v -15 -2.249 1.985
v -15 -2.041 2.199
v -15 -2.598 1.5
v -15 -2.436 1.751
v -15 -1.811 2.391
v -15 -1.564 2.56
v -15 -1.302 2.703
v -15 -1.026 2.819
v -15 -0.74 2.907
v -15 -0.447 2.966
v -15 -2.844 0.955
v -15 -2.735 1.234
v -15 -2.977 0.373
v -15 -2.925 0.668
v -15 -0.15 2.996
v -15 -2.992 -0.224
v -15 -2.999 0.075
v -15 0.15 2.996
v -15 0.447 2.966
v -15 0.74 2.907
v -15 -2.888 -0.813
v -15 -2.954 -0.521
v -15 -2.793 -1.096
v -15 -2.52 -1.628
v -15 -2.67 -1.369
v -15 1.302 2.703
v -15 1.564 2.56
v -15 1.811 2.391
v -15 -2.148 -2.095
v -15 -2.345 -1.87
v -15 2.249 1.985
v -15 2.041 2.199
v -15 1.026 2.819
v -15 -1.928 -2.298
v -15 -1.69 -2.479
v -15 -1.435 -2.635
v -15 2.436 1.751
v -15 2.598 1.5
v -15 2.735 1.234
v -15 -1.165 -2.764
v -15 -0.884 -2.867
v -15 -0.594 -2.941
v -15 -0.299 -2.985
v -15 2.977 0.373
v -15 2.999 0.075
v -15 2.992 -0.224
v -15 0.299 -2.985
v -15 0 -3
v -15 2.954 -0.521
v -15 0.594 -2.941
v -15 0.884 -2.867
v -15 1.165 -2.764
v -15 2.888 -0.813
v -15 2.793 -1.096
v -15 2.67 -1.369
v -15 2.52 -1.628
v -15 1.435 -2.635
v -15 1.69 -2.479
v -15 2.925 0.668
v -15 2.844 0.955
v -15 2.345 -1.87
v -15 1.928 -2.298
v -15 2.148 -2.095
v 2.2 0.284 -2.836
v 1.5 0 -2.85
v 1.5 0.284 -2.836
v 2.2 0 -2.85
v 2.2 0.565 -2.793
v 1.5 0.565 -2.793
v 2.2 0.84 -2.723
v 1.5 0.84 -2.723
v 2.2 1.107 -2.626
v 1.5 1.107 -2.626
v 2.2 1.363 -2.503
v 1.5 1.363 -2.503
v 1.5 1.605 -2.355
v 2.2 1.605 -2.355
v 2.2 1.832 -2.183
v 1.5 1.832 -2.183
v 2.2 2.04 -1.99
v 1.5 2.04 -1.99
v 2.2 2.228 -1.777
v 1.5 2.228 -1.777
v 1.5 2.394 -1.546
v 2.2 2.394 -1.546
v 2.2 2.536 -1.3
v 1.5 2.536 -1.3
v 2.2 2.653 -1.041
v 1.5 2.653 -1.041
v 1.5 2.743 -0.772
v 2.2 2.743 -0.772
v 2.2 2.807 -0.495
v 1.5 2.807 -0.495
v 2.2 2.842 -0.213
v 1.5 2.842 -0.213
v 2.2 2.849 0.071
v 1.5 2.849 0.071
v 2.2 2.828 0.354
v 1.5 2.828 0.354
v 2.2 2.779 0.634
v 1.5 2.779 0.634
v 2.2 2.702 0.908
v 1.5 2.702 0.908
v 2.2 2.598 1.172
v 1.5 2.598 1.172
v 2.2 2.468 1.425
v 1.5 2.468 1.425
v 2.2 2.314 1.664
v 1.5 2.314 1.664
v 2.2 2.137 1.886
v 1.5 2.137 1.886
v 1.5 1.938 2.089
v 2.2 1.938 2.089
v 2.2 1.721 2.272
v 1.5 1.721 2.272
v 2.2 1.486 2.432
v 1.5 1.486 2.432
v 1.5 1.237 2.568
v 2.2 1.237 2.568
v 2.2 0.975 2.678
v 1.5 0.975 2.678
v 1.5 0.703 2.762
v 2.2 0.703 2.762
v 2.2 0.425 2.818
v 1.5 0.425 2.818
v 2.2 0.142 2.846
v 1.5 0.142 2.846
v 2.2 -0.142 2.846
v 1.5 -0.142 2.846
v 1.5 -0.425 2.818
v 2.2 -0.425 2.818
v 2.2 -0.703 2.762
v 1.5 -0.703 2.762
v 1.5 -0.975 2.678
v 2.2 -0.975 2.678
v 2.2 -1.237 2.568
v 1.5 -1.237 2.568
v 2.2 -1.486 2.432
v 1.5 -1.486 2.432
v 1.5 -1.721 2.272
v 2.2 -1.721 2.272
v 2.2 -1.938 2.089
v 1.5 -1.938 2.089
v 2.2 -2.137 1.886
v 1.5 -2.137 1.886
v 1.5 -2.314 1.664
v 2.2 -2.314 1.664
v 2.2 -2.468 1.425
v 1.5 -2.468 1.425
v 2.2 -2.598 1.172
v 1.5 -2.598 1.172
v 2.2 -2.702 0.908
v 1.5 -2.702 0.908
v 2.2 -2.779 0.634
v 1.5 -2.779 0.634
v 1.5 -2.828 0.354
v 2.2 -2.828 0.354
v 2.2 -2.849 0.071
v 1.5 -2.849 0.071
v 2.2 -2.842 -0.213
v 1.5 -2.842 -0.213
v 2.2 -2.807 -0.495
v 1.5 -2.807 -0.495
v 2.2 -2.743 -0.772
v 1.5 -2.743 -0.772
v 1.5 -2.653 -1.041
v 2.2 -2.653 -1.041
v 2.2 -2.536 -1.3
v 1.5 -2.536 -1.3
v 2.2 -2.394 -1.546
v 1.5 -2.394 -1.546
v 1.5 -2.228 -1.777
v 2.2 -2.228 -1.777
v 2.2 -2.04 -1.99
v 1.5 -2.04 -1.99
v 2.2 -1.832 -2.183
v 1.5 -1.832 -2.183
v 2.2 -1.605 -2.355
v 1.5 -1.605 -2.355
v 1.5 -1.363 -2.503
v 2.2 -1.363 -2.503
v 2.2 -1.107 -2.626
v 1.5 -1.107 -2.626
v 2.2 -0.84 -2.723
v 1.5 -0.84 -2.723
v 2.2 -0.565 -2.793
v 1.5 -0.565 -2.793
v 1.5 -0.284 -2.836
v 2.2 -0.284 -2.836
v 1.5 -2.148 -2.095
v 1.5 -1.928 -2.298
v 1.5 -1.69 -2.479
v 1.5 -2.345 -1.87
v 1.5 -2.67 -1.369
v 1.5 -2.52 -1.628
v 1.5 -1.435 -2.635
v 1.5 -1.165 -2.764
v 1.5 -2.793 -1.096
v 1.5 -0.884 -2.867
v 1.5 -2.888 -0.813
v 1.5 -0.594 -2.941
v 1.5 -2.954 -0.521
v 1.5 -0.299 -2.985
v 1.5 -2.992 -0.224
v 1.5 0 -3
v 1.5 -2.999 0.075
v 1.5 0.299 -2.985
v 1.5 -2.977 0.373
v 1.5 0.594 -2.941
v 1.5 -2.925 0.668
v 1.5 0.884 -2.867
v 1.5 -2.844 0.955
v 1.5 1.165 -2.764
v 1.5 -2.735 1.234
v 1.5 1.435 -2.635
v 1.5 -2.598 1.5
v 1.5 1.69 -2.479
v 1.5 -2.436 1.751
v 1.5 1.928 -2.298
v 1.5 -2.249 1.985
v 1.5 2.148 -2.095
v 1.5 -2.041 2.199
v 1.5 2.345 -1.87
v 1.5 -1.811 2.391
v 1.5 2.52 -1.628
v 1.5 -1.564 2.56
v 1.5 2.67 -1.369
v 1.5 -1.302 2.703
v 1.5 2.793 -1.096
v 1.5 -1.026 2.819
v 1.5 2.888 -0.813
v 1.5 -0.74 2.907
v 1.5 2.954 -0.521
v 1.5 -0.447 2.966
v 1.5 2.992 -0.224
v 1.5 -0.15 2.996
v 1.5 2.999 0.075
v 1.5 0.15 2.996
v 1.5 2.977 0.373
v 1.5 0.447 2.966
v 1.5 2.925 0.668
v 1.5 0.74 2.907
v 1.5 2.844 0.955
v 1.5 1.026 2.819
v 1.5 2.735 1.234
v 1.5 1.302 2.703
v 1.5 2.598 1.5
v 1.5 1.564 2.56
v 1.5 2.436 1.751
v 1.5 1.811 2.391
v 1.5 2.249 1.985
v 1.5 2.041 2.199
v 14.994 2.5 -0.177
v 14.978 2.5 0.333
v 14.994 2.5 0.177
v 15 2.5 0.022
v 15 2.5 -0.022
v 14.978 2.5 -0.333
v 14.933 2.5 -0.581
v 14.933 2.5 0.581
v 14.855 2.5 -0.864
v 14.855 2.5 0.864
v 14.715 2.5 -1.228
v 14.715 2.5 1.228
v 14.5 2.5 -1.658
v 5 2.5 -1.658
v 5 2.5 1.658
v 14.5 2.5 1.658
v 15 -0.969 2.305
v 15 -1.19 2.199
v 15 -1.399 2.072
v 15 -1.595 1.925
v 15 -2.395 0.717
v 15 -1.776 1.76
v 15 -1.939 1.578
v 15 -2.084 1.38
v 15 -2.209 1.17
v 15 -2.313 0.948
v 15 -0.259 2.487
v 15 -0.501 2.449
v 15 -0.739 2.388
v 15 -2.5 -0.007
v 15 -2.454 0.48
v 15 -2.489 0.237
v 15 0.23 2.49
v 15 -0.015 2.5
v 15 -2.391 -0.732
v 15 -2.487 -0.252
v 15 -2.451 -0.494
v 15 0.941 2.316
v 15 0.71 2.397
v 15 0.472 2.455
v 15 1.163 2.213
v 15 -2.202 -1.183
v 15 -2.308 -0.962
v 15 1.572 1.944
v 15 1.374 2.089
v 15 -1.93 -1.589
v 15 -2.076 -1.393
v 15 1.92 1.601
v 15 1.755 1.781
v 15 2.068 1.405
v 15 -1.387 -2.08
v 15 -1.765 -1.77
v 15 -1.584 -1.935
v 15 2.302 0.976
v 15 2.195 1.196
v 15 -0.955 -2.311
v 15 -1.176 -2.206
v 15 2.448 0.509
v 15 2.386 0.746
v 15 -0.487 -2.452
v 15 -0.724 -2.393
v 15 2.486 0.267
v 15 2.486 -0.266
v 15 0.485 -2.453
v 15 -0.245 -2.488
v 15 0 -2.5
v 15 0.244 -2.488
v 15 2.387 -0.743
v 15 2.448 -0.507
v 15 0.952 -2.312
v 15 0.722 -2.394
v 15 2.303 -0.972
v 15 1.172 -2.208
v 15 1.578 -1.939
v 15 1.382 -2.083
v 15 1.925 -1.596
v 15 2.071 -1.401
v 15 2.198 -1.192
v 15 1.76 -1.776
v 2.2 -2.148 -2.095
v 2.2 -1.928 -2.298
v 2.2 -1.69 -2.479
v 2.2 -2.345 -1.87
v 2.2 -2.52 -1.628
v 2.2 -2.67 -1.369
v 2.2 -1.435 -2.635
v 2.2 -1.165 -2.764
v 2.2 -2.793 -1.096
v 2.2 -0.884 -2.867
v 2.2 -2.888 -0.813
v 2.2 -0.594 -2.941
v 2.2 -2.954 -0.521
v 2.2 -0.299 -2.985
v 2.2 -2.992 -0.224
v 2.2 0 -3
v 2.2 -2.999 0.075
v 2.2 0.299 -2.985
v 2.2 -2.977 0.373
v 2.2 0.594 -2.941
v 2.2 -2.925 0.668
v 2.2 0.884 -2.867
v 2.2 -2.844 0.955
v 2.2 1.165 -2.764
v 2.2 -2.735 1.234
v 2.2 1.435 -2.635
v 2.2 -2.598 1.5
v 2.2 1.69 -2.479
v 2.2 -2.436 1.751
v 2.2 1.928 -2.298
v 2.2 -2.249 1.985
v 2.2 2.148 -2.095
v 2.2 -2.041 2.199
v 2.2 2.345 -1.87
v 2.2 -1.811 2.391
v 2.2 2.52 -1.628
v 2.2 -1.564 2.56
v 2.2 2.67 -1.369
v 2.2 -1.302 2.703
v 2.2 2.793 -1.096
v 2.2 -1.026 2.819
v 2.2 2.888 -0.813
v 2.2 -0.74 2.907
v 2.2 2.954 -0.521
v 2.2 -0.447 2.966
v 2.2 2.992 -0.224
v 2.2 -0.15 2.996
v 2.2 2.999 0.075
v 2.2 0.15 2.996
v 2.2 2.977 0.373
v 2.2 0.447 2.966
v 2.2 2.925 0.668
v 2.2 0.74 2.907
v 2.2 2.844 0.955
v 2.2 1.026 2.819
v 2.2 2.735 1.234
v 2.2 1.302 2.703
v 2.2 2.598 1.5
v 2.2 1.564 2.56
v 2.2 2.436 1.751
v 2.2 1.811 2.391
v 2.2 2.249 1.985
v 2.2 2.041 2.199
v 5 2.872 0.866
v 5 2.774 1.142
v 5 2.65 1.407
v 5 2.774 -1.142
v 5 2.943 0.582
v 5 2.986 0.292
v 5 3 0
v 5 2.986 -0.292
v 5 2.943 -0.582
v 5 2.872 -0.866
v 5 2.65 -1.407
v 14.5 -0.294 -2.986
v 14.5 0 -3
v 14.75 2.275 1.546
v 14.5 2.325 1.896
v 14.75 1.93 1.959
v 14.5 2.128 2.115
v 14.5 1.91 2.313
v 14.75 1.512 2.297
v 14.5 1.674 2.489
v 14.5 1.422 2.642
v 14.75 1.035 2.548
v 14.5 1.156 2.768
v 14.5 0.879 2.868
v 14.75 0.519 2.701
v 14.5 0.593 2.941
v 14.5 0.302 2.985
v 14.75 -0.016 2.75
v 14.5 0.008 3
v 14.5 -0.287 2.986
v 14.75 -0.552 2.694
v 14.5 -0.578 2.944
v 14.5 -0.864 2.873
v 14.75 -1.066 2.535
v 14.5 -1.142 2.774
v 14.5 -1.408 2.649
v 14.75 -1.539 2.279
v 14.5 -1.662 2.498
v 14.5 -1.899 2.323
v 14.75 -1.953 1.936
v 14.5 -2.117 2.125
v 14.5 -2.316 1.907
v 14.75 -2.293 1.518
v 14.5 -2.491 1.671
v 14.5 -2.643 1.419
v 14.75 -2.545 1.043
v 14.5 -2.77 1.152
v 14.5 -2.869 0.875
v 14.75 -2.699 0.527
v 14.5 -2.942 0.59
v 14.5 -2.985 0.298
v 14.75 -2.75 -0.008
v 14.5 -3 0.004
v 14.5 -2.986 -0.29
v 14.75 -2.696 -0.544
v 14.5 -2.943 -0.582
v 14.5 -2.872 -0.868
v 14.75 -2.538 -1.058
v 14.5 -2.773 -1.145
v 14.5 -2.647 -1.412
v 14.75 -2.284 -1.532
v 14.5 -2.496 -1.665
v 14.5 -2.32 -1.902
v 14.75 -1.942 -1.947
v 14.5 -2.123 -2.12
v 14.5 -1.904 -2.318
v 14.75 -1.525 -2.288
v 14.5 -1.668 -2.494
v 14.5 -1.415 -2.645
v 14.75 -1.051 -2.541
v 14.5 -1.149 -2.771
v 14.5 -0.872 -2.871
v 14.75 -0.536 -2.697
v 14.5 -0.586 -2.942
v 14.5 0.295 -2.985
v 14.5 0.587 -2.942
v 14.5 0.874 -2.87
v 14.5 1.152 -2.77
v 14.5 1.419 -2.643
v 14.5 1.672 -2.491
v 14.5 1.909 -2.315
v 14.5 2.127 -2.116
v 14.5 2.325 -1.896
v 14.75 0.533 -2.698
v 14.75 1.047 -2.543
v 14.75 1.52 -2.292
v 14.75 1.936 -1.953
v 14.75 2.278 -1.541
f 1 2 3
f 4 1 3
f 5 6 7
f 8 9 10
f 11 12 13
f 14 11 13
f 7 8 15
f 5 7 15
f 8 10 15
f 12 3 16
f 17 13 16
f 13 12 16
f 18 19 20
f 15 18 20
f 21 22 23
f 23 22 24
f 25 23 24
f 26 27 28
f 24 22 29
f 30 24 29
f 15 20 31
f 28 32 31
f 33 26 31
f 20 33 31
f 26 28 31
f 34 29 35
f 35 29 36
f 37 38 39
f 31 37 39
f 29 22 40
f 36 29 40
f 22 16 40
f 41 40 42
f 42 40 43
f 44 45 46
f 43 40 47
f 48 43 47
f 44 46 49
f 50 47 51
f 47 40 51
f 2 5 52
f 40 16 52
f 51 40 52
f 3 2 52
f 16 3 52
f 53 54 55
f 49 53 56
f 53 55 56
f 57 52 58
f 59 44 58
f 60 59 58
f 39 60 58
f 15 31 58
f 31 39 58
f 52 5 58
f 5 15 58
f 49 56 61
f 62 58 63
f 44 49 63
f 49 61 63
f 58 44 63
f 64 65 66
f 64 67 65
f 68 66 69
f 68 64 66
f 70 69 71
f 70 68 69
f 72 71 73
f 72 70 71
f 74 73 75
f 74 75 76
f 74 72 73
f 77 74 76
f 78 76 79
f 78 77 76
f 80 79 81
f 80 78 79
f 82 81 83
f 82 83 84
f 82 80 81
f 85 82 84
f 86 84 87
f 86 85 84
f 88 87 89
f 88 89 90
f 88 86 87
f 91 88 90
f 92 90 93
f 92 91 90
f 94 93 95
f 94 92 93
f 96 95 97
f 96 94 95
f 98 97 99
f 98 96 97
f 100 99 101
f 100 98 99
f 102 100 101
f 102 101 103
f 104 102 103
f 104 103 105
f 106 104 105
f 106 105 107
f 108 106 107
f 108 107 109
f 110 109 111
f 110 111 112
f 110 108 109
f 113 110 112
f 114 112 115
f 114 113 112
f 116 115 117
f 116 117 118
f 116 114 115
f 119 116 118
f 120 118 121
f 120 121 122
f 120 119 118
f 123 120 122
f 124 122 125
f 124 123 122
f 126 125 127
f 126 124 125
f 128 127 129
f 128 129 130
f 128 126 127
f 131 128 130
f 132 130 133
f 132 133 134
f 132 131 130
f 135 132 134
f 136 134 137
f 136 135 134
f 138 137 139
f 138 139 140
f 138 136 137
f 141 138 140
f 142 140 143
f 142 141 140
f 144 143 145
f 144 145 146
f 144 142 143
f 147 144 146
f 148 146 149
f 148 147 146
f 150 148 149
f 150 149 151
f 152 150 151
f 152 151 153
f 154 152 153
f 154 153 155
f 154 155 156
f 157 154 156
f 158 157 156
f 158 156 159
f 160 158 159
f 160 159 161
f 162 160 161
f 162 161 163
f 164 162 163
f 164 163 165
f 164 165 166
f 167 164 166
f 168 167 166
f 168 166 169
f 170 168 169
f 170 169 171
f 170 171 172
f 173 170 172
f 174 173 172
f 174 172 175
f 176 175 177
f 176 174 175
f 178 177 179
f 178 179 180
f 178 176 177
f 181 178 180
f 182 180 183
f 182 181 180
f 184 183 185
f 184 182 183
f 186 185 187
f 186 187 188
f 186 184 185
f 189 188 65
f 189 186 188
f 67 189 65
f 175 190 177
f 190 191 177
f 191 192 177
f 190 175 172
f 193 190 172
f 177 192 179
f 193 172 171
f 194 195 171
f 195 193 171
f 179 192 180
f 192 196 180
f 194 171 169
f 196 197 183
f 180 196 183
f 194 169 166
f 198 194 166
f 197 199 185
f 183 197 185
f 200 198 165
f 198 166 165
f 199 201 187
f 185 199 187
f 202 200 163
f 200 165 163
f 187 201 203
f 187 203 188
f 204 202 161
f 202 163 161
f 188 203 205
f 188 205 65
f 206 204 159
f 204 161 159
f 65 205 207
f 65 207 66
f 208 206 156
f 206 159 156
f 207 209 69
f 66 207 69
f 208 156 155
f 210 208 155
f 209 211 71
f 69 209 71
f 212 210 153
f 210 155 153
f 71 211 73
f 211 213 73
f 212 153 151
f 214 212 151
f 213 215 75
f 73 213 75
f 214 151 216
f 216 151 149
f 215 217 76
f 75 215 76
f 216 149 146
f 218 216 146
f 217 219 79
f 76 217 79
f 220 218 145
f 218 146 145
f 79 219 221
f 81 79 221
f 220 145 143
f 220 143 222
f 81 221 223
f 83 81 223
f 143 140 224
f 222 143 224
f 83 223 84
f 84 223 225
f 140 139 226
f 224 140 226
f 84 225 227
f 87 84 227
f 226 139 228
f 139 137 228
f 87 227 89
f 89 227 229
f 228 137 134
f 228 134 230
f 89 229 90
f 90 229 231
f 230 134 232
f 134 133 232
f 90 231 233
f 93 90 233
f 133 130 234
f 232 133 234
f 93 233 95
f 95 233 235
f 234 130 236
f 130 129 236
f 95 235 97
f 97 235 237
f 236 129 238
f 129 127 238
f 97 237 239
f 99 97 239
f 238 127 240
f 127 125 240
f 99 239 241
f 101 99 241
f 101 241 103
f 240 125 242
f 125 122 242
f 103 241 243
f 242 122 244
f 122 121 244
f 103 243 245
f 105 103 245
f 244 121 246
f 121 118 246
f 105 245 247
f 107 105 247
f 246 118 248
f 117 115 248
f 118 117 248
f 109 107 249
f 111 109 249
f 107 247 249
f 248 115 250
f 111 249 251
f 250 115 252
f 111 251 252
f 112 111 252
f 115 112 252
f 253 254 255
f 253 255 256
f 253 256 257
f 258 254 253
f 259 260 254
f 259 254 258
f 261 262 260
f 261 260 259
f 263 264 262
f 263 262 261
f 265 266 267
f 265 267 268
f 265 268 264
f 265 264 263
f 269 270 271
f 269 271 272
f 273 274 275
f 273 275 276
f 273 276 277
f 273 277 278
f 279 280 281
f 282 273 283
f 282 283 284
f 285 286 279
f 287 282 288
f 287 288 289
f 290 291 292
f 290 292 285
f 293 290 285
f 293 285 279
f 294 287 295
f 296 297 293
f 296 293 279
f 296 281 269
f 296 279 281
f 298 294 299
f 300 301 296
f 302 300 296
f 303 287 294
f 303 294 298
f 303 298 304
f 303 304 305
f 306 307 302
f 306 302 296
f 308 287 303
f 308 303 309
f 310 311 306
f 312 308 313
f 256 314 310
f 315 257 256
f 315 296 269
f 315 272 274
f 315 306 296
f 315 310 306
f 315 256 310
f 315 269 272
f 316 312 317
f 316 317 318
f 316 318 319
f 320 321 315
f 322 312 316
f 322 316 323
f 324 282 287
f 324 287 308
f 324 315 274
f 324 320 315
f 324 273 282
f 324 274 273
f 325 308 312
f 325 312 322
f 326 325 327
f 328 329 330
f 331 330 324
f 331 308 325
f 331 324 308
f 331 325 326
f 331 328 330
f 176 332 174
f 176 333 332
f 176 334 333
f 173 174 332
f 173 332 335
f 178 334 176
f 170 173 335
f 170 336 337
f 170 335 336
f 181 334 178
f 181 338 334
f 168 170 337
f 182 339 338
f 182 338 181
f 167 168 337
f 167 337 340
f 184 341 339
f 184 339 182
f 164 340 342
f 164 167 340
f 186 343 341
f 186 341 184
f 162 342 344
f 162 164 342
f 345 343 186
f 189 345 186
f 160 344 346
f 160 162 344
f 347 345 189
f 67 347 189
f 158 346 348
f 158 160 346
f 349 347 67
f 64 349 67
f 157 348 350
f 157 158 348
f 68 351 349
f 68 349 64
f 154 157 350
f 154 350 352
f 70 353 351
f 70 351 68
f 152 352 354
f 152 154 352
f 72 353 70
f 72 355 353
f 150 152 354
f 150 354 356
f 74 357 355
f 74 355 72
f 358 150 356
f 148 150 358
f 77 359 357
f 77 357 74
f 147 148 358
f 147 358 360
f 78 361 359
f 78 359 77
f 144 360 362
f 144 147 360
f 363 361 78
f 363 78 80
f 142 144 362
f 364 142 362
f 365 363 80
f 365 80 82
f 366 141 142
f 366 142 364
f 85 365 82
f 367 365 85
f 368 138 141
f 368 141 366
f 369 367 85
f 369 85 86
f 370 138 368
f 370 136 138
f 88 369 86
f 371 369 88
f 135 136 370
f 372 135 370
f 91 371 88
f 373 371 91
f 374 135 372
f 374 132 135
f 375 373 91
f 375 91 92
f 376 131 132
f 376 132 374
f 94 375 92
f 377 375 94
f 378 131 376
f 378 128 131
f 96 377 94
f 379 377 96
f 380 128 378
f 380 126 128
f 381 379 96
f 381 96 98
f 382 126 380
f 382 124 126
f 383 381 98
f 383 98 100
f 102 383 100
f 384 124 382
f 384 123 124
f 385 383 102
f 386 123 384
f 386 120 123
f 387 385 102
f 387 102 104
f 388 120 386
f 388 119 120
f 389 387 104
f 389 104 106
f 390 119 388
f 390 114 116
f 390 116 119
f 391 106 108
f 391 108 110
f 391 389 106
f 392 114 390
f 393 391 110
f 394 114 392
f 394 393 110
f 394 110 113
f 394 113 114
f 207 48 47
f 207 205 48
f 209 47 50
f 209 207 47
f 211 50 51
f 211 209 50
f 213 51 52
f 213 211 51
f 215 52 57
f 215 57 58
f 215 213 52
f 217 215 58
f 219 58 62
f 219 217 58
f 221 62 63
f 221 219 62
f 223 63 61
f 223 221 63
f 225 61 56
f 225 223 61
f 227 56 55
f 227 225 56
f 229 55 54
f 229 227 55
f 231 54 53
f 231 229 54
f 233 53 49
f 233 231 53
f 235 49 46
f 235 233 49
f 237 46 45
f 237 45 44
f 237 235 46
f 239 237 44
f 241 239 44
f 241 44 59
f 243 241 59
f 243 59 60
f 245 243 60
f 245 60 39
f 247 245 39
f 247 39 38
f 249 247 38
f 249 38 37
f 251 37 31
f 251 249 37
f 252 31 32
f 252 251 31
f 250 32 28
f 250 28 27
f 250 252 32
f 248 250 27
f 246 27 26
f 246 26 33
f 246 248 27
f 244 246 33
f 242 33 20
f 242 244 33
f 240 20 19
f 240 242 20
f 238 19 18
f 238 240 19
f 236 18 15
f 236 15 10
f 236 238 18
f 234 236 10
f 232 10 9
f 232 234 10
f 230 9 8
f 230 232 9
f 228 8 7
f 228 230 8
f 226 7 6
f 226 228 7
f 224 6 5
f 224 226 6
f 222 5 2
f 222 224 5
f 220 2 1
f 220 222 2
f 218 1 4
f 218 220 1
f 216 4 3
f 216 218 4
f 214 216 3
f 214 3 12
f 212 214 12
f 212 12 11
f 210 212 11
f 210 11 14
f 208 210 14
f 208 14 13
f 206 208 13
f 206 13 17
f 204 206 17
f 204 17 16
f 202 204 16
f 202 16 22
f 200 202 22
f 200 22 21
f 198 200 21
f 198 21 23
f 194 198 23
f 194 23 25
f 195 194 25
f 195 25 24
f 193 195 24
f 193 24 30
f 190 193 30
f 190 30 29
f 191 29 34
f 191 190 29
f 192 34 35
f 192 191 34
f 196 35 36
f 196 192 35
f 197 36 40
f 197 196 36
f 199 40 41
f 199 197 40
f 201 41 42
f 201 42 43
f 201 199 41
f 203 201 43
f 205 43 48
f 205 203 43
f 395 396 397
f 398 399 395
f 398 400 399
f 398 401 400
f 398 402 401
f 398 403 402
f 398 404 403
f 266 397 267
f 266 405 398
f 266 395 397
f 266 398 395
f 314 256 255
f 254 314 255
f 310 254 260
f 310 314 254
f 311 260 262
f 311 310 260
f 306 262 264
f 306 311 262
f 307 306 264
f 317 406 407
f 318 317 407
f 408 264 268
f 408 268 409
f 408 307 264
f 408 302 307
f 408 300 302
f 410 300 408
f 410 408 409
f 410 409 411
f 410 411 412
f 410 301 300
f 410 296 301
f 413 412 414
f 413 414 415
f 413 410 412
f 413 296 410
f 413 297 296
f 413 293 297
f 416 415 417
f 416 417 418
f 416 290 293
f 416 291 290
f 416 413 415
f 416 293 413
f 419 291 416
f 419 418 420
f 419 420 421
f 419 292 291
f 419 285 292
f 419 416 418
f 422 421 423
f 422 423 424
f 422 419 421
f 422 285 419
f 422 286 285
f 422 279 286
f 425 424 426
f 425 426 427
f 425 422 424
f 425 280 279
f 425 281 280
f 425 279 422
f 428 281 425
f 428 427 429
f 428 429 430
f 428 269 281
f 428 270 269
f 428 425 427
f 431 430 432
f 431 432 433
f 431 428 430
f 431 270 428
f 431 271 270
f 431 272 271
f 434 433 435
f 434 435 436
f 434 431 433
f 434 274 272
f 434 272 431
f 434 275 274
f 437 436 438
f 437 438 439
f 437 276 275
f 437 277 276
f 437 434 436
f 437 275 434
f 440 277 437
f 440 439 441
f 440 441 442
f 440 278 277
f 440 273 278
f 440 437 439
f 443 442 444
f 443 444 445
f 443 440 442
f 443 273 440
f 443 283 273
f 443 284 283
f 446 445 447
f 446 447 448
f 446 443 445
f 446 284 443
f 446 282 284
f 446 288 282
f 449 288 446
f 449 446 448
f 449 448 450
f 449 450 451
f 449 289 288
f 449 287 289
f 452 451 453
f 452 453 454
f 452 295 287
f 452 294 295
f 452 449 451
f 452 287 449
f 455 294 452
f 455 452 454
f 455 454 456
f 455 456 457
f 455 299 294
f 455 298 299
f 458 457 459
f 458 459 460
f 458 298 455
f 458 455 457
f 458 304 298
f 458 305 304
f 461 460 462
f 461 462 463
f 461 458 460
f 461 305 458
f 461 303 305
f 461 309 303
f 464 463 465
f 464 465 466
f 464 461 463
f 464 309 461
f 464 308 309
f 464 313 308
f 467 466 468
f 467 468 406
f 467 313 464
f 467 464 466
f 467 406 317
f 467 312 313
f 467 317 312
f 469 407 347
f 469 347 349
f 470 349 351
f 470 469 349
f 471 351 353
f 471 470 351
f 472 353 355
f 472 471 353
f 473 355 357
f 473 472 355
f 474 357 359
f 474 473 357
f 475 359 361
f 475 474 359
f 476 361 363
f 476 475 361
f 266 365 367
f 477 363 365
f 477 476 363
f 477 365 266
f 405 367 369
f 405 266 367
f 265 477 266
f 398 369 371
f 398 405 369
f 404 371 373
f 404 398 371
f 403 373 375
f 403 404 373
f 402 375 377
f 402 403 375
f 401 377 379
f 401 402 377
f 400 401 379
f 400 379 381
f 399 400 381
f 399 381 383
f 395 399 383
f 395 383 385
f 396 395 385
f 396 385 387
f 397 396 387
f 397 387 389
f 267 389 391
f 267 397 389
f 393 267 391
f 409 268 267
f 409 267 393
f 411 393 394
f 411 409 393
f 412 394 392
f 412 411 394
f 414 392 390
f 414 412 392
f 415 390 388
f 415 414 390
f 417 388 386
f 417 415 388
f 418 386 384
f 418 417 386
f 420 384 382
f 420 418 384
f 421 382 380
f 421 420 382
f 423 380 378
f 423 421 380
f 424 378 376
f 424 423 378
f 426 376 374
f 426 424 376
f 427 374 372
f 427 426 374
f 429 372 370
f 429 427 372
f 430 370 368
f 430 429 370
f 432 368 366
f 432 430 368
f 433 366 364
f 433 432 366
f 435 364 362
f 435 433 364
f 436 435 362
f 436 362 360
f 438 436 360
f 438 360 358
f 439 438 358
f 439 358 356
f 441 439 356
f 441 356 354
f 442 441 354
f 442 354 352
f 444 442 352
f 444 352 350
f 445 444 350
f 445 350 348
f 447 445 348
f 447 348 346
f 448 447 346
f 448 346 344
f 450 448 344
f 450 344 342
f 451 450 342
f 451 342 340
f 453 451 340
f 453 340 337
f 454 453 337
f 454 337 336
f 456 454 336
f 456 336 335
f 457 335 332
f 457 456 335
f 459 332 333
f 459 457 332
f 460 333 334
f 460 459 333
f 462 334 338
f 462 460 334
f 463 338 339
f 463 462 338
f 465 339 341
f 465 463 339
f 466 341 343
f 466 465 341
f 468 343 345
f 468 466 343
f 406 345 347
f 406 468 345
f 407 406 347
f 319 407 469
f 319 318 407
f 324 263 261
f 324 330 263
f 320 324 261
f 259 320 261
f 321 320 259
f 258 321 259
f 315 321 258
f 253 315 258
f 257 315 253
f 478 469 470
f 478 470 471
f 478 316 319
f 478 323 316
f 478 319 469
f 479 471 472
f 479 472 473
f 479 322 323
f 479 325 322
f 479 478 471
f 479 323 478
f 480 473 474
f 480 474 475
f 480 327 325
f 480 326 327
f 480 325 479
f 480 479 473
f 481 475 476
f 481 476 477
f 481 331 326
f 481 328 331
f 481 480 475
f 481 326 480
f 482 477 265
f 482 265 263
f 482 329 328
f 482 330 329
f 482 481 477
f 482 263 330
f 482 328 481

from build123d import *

# Parameters (mm, degrees)
BODYS_R       = 3
BODY_DEPTH    = 15
FLATS_W       = 10
FLATS_H       = 6
FLAT_DEPTH    = 0.5
GROOVES_W     = 0.75
GROOVES_H     = 0.7
CHAMFER1_SIZE = 0.5


with BuildPart() as part:
    # BodyS → Body (new, symmetric)
    with BuildSketch(Plane(origin=(0, 0, 0), x_dir=(0, 0, -1), z_dir=(1, 0, 0))):
        Circle(BODYS_R)
    extrude(amount=BODY_DEPTH, both=True)

    # FlatS → Flat (cut)
    with BuildSketch(Plane(origin=(0, 3, 0), x_dir=(1, 0, 0), z_dir=(0, 1, 0))):
        with Locations((10, 0)):
            Rectangle(FLATS_W, FLATS_H)
    extrude(amount=-FLAT_DEPTH, mode=Mode.SUBTRACT)

    # GrooveS → Groove for ANSI B27.7 - 3AM1-6, Basic External Retaining Ring1 (revolve, cut)
    with BuildSketch(Plane(origin=(-15, 0, 0), x_dir=(0, 0, -1), z_dir=(0, -1, 0))):
        with Locations((3.225, 16.85)):
            Rectangle(GROOVES_W, GROOVES_H)
    revolve(axis=Axis((-62.5, 0, 0), (1, 0, 0)), mode=Mode.SUBTRACT)

    # Chamfer1
    chamfer1_edges = [part.edges().sort_by_distance(p)[0] for p in [
        (15, -2.643382037, 1.418637165),
    ]]
    chamfer(chamfer1_edges, length=CHAMFER1_SIZE - 0.0001)  # a hair under: the kernel refuses the full size


solid = part.part
